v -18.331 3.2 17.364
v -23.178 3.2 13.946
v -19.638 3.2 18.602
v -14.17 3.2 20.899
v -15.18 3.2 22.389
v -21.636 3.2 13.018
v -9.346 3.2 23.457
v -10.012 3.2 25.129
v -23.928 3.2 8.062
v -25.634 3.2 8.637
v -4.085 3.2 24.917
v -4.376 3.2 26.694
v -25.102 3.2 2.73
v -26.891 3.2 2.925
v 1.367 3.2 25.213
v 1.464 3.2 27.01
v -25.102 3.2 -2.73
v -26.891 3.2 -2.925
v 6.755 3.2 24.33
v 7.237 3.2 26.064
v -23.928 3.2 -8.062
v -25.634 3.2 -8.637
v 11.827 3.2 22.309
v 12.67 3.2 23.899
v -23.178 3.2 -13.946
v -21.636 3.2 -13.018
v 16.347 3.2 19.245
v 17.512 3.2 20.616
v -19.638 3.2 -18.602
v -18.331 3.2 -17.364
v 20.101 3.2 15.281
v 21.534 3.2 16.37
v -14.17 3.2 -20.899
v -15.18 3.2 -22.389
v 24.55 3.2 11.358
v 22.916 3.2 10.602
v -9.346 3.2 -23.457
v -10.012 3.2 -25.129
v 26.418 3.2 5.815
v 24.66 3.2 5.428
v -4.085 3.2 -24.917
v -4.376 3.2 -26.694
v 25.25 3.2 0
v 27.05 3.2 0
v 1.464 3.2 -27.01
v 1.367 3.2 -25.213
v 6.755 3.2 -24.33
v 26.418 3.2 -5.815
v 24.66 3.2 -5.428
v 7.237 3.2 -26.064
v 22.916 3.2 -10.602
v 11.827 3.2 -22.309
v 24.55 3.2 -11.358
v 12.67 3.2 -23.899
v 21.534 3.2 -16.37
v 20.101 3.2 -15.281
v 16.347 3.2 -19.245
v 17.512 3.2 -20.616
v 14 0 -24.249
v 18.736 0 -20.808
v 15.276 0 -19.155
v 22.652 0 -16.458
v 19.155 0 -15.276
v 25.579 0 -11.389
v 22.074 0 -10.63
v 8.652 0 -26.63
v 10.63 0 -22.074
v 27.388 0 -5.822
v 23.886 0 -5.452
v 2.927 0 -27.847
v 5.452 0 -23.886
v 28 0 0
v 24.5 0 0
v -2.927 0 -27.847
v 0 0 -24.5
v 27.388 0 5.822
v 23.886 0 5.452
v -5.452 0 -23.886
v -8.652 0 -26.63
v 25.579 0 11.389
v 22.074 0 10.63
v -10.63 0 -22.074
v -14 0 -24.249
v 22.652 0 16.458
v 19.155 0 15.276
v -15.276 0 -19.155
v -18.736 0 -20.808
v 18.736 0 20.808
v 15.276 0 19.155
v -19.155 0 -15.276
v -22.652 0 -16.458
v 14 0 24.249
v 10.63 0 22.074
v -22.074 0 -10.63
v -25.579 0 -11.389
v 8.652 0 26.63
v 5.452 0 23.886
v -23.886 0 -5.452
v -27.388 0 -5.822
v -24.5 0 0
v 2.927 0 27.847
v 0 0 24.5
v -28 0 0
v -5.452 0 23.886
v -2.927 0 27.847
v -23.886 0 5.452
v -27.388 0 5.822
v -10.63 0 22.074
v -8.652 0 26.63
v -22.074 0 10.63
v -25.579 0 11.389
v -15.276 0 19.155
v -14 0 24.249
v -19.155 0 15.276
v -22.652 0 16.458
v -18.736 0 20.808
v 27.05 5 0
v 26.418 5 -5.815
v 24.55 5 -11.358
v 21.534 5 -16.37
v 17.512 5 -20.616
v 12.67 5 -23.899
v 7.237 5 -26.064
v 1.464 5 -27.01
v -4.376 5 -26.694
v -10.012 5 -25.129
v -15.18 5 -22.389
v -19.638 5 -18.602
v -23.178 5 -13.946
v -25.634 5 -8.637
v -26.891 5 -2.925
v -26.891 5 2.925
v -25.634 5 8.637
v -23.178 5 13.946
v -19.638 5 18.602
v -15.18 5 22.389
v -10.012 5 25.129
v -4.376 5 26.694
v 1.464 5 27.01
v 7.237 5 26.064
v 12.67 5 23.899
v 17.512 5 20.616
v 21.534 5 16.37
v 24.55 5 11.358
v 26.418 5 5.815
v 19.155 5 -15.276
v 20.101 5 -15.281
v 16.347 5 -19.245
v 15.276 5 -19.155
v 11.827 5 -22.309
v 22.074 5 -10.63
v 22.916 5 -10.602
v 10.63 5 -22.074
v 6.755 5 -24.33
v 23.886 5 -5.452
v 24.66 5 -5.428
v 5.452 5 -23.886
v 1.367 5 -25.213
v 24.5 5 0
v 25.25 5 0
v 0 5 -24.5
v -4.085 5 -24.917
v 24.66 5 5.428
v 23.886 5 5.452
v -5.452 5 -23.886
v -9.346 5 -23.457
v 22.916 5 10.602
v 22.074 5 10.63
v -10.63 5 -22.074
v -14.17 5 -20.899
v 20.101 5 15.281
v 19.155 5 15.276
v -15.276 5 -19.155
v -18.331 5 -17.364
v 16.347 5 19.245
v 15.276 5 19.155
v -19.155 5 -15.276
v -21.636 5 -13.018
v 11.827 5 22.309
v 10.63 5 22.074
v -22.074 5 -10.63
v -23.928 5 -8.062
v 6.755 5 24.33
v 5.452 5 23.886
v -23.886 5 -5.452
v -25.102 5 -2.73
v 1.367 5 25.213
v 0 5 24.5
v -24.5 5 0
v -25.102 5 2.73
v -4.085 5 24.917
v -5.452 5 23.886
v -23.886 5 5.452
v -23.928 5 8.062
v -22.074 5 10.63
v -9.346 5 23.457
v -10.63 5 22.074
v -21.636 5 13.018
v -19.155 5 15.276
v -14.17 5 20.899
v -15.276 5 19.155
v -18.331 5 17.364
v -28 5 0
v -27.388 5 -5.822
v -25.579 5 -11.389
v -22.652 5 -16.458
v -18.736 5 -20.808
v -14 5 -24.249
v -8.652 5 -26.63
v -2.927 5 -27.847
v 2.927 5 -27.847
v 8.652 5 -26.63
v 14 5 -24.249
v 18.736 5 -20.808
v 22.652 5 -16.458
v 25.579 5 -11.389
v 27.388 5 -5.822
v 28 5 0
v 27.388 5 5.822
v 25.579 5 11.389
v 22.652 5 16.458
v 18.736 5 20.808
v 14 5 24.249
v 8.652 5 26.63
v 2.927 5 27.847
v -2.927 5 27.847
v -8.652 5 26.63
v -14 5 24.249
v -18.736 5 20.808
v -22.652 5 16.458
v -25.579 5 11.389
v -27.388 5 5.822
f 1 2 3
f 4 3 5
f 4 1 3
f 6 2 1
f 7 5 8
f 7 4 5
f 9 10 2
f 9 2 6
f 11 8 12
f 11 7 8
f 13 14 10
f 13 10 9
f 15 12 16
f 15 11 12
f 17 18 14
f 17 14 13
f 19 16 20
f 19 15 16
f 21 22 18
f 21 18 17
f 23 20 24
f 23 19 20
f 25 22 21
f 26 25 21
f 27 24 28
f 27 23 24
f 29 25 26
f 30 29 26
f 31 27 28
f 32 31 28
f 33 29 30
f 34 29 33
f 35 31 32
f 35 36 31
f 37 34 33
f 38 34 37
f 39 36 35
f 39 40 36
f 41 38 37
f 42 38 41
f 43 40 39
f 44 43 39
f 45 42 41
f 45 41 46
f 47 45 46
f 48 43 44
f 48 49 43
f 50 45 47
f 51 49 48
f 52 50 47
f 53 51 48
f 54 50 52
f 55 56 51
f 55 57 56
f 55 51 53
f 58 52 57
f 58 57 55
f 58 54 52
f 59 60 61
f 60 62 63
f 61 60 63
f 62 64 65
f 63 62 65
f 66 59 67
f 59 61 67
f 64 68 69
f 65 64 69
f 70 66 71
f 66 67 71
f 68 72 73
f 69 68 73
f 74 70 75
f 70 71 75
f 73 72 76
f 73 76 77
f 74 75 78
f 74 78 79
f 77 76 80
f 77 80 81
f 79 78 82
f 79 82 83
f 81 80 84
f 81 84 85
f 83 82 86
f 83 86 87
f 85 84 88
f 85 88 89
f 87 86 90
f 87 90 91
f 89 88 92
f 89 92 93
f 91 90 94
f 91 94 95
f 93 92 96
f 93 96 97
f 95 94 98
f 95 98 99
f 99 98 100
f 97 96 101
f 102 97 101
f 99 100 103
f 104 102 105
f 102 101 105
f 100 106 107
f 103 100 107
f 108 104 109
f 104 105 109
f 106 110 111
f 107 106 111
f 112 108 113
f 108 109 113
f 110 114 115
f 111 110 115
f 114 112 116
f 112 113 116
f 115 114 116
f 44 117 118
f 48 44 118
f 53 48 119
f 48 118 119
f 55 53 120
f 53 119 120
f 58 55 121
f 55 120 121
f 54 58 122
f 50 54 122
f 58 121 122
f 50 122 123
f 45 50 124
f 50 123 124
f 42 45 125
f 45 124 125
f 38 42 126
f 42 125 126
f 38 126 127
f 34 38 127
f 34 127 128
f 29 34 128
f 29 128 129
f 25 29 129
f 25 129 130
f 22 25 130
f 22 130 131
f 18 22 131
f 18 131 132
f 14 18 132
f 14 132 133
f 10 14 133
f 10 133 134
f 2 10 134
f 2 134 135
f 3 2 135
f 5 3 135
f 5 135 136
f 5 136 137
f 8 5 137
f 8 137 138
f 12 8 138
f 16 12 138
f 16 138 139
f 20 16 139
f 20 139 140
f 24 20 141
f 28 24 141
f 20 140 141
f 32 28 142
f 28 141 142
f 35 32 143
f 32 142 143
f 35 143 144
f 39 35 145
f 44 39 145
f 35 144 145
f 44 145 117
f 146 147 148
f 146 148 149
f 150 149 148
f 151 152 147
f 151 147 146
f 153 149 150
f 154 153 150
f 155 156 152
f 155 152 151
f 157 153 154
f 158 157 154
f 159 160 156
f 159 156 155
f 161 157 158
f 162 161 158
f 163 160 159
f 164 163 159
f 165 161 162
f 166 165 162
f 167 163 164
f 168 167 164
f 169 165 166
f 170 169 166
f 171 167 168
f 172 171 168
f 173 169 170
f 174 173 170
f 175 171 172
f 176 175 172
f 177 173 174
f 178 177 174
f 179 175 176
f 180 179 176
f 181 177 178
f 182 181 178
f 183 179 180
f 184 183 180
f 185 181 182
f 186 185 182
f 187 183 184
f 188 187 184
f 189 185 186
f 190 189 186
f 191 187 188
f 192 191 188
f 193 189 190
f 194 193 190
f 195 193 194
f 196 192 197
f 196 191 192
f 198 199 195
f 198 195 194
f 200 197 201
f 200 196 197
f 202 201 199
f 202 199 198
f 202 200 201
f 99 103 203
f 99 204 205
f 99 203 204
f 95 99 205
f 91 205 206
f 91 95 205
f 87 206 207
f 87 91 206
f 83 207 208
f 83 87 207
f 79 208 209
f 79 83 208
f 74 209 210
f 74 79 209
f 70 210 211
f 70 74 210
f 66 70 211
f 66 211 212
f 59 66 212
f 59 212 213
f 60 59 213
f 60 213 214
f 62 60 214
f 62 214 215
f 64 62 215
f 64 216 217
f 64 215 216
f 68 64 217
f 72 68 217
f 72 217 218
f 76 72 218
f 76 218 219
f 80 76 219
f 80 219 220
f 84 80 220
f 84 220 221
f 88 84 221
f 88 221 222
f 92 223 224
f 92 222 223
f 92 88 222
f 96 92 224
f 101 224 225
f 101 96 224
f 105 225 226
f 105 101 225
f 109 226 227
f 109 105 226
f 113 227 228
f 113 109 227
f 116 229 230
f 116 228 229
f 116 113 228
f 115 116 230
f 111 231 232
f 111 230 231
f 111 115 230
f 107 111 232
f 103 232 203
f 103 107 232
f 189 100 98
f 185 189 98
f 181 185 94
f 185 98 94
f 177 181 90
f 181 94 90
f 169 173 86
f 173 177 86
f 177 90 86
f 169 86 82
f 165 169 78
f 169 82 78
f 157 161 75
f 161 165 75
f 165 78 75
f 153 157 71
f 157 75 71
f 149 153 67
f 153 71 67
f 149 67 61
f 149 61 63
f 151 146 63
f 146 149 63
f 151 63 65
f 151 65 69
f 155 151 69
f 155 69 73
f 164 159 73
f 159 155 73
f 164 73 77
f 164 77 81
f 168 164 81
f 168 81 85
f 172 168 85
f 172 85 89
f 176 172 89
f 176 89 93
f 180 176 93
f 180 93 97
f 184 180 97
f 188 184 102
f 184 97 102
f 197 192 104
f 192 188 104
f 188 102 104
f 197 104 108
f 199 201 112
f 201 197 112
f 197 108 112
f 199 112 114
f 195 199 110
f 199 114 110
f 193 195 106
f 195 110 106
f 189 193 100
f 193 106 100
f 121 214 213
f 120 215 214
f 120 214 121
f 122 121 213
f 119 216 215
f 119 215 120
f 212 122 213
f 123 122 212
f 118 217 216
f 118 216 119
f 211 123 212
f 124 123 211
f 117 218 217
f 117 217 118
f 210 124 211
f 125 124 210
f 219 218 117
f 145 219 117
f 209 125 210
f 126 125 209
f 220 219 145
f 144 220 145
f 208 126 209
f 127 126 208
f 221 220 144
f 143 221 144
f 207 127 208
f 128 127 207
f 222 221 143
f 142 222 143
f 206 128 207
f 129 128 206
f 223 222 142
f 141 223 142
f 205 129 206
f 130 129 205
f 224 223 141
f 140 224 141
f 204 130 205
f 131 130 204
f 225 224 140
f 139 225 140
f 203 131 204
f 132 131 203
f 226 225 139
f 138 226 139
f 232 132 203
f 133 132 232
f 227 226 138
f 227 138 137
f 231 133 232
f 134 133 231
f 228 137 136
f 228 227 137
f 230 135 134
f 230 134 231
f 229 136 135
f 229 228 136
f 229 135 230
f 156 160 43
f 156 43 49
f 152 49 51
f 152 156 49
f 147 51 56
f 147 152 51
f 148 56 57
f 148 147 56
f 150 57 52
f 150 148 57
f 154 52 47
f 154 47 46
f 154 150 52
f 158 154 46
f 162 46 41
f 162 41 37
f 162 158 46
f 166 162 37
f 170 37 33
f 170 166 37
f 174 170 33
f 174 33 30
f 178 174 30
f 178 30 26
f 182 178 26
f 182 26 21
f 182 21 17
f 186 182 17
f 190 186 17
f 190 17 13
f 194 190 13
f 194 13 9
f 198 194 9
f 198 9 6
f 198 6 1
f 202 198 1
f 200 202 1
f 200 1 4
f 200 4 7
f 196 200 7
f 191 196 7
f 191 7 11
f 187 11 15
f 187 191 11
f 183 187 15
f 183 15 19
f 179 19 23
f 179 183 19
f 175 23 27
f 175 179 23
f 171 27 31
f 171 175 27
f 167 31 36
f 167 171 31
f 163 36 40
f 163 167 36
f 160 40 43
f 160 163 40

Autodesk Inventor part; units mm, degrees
ref_plane "YZ Plane" through (0, 0, 0) normal (1, 0, 0) x (0, 1, 0)
ref_plane "XZ Plane" through (0, 0, 0) normal (0, 1, 0) x (-1, 0, 0)
sketch "Sketch1" plane through (0, 0, 0) normal (0, 1, 0) x (-1, 0, 0)
  circle A0 centre (0, 0) radius 28
  circle A1 centre (0, 0) radius 24.5
  dimension "d0" = 56
  dimension "d5" = 49
extrude "Extrusion2" add sketch "Sketch1" along normal blind 5
sketch "Sketch3" plane through (0, 5, 0) normal (0, 1, 0) x (1, 0, 0)
  circle A0 centre (0, 0) radius 25.25
  circle A1 centre (0, 0) radius 27.05
  dimension "d8" = 50.5
  dimension "d9" = 54.1
extrude "Extrusion3" cut sketch "Sketch3" against normal blind 1.8
ref_plane "Work Plane1" through (0, 4.1, 0) normal (0, -1, 0) x (1, 0, 0)
properties part number "Smaller Cap"
